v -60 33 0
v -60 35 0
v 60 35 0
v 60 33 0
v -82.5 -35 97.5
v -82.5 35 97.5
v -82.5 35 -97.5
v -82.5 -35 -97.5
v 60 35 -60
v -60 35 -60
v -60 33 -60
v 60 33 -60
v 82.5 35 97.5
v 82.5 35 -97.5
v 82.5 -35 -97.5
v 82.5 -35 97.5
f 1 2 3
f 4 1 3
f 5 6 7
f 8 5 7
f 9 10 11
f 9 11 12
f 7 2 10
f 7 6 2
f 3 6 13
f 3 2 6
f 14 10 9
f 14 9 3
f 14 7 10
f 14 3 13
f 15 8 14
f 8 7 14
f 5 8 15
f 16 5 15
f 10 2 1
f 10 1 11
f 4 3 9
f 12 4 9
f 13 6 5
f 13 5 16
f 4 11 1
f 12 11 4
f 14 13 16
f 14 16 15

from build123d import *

# Parameters (mm, degrees)
ESQUISSE1_W             = 165
ESQUISSE1_H             = 195
BOSS_EXTRU_1_DEPTH      = 35
ESQUISSE4_W             = 120
ESQUISSE4_H             = 60
ENL_V_MAT_EXTRU_1_DEPTH = 2


with BuildPart() as part:
    # Esquisse1 → Boss.-Extru.1 (new body, symmetric)
    with BuildSketch(Plane(origin=(0, 0, 0), x_dir=(1, 0, 0), z_dir=(0, 1, 0))):
        Rectangle(ESQUISSE1_W, ESQUISSE1_H)
    extrude(amount=BOSS_EXTRU_1_DEPTH, both=True)

    # Esquisse4 → Enlèv. mat.-Extru.1 (cut)
    with BuildSketch(Plane(origin=(0, 35, 0), x_dir=(1, 0, 0), z_dir=(0, 1, 0))):
        with Locations((0, 30)):
            Rectangle(ESQUISSE4_W, ESQUISSE4_H)
    extrude(amount=-ENL_V_MAT_EXTRU_1_DEPTH, mode=Mode.SUBTRACT)


solid = part.part
